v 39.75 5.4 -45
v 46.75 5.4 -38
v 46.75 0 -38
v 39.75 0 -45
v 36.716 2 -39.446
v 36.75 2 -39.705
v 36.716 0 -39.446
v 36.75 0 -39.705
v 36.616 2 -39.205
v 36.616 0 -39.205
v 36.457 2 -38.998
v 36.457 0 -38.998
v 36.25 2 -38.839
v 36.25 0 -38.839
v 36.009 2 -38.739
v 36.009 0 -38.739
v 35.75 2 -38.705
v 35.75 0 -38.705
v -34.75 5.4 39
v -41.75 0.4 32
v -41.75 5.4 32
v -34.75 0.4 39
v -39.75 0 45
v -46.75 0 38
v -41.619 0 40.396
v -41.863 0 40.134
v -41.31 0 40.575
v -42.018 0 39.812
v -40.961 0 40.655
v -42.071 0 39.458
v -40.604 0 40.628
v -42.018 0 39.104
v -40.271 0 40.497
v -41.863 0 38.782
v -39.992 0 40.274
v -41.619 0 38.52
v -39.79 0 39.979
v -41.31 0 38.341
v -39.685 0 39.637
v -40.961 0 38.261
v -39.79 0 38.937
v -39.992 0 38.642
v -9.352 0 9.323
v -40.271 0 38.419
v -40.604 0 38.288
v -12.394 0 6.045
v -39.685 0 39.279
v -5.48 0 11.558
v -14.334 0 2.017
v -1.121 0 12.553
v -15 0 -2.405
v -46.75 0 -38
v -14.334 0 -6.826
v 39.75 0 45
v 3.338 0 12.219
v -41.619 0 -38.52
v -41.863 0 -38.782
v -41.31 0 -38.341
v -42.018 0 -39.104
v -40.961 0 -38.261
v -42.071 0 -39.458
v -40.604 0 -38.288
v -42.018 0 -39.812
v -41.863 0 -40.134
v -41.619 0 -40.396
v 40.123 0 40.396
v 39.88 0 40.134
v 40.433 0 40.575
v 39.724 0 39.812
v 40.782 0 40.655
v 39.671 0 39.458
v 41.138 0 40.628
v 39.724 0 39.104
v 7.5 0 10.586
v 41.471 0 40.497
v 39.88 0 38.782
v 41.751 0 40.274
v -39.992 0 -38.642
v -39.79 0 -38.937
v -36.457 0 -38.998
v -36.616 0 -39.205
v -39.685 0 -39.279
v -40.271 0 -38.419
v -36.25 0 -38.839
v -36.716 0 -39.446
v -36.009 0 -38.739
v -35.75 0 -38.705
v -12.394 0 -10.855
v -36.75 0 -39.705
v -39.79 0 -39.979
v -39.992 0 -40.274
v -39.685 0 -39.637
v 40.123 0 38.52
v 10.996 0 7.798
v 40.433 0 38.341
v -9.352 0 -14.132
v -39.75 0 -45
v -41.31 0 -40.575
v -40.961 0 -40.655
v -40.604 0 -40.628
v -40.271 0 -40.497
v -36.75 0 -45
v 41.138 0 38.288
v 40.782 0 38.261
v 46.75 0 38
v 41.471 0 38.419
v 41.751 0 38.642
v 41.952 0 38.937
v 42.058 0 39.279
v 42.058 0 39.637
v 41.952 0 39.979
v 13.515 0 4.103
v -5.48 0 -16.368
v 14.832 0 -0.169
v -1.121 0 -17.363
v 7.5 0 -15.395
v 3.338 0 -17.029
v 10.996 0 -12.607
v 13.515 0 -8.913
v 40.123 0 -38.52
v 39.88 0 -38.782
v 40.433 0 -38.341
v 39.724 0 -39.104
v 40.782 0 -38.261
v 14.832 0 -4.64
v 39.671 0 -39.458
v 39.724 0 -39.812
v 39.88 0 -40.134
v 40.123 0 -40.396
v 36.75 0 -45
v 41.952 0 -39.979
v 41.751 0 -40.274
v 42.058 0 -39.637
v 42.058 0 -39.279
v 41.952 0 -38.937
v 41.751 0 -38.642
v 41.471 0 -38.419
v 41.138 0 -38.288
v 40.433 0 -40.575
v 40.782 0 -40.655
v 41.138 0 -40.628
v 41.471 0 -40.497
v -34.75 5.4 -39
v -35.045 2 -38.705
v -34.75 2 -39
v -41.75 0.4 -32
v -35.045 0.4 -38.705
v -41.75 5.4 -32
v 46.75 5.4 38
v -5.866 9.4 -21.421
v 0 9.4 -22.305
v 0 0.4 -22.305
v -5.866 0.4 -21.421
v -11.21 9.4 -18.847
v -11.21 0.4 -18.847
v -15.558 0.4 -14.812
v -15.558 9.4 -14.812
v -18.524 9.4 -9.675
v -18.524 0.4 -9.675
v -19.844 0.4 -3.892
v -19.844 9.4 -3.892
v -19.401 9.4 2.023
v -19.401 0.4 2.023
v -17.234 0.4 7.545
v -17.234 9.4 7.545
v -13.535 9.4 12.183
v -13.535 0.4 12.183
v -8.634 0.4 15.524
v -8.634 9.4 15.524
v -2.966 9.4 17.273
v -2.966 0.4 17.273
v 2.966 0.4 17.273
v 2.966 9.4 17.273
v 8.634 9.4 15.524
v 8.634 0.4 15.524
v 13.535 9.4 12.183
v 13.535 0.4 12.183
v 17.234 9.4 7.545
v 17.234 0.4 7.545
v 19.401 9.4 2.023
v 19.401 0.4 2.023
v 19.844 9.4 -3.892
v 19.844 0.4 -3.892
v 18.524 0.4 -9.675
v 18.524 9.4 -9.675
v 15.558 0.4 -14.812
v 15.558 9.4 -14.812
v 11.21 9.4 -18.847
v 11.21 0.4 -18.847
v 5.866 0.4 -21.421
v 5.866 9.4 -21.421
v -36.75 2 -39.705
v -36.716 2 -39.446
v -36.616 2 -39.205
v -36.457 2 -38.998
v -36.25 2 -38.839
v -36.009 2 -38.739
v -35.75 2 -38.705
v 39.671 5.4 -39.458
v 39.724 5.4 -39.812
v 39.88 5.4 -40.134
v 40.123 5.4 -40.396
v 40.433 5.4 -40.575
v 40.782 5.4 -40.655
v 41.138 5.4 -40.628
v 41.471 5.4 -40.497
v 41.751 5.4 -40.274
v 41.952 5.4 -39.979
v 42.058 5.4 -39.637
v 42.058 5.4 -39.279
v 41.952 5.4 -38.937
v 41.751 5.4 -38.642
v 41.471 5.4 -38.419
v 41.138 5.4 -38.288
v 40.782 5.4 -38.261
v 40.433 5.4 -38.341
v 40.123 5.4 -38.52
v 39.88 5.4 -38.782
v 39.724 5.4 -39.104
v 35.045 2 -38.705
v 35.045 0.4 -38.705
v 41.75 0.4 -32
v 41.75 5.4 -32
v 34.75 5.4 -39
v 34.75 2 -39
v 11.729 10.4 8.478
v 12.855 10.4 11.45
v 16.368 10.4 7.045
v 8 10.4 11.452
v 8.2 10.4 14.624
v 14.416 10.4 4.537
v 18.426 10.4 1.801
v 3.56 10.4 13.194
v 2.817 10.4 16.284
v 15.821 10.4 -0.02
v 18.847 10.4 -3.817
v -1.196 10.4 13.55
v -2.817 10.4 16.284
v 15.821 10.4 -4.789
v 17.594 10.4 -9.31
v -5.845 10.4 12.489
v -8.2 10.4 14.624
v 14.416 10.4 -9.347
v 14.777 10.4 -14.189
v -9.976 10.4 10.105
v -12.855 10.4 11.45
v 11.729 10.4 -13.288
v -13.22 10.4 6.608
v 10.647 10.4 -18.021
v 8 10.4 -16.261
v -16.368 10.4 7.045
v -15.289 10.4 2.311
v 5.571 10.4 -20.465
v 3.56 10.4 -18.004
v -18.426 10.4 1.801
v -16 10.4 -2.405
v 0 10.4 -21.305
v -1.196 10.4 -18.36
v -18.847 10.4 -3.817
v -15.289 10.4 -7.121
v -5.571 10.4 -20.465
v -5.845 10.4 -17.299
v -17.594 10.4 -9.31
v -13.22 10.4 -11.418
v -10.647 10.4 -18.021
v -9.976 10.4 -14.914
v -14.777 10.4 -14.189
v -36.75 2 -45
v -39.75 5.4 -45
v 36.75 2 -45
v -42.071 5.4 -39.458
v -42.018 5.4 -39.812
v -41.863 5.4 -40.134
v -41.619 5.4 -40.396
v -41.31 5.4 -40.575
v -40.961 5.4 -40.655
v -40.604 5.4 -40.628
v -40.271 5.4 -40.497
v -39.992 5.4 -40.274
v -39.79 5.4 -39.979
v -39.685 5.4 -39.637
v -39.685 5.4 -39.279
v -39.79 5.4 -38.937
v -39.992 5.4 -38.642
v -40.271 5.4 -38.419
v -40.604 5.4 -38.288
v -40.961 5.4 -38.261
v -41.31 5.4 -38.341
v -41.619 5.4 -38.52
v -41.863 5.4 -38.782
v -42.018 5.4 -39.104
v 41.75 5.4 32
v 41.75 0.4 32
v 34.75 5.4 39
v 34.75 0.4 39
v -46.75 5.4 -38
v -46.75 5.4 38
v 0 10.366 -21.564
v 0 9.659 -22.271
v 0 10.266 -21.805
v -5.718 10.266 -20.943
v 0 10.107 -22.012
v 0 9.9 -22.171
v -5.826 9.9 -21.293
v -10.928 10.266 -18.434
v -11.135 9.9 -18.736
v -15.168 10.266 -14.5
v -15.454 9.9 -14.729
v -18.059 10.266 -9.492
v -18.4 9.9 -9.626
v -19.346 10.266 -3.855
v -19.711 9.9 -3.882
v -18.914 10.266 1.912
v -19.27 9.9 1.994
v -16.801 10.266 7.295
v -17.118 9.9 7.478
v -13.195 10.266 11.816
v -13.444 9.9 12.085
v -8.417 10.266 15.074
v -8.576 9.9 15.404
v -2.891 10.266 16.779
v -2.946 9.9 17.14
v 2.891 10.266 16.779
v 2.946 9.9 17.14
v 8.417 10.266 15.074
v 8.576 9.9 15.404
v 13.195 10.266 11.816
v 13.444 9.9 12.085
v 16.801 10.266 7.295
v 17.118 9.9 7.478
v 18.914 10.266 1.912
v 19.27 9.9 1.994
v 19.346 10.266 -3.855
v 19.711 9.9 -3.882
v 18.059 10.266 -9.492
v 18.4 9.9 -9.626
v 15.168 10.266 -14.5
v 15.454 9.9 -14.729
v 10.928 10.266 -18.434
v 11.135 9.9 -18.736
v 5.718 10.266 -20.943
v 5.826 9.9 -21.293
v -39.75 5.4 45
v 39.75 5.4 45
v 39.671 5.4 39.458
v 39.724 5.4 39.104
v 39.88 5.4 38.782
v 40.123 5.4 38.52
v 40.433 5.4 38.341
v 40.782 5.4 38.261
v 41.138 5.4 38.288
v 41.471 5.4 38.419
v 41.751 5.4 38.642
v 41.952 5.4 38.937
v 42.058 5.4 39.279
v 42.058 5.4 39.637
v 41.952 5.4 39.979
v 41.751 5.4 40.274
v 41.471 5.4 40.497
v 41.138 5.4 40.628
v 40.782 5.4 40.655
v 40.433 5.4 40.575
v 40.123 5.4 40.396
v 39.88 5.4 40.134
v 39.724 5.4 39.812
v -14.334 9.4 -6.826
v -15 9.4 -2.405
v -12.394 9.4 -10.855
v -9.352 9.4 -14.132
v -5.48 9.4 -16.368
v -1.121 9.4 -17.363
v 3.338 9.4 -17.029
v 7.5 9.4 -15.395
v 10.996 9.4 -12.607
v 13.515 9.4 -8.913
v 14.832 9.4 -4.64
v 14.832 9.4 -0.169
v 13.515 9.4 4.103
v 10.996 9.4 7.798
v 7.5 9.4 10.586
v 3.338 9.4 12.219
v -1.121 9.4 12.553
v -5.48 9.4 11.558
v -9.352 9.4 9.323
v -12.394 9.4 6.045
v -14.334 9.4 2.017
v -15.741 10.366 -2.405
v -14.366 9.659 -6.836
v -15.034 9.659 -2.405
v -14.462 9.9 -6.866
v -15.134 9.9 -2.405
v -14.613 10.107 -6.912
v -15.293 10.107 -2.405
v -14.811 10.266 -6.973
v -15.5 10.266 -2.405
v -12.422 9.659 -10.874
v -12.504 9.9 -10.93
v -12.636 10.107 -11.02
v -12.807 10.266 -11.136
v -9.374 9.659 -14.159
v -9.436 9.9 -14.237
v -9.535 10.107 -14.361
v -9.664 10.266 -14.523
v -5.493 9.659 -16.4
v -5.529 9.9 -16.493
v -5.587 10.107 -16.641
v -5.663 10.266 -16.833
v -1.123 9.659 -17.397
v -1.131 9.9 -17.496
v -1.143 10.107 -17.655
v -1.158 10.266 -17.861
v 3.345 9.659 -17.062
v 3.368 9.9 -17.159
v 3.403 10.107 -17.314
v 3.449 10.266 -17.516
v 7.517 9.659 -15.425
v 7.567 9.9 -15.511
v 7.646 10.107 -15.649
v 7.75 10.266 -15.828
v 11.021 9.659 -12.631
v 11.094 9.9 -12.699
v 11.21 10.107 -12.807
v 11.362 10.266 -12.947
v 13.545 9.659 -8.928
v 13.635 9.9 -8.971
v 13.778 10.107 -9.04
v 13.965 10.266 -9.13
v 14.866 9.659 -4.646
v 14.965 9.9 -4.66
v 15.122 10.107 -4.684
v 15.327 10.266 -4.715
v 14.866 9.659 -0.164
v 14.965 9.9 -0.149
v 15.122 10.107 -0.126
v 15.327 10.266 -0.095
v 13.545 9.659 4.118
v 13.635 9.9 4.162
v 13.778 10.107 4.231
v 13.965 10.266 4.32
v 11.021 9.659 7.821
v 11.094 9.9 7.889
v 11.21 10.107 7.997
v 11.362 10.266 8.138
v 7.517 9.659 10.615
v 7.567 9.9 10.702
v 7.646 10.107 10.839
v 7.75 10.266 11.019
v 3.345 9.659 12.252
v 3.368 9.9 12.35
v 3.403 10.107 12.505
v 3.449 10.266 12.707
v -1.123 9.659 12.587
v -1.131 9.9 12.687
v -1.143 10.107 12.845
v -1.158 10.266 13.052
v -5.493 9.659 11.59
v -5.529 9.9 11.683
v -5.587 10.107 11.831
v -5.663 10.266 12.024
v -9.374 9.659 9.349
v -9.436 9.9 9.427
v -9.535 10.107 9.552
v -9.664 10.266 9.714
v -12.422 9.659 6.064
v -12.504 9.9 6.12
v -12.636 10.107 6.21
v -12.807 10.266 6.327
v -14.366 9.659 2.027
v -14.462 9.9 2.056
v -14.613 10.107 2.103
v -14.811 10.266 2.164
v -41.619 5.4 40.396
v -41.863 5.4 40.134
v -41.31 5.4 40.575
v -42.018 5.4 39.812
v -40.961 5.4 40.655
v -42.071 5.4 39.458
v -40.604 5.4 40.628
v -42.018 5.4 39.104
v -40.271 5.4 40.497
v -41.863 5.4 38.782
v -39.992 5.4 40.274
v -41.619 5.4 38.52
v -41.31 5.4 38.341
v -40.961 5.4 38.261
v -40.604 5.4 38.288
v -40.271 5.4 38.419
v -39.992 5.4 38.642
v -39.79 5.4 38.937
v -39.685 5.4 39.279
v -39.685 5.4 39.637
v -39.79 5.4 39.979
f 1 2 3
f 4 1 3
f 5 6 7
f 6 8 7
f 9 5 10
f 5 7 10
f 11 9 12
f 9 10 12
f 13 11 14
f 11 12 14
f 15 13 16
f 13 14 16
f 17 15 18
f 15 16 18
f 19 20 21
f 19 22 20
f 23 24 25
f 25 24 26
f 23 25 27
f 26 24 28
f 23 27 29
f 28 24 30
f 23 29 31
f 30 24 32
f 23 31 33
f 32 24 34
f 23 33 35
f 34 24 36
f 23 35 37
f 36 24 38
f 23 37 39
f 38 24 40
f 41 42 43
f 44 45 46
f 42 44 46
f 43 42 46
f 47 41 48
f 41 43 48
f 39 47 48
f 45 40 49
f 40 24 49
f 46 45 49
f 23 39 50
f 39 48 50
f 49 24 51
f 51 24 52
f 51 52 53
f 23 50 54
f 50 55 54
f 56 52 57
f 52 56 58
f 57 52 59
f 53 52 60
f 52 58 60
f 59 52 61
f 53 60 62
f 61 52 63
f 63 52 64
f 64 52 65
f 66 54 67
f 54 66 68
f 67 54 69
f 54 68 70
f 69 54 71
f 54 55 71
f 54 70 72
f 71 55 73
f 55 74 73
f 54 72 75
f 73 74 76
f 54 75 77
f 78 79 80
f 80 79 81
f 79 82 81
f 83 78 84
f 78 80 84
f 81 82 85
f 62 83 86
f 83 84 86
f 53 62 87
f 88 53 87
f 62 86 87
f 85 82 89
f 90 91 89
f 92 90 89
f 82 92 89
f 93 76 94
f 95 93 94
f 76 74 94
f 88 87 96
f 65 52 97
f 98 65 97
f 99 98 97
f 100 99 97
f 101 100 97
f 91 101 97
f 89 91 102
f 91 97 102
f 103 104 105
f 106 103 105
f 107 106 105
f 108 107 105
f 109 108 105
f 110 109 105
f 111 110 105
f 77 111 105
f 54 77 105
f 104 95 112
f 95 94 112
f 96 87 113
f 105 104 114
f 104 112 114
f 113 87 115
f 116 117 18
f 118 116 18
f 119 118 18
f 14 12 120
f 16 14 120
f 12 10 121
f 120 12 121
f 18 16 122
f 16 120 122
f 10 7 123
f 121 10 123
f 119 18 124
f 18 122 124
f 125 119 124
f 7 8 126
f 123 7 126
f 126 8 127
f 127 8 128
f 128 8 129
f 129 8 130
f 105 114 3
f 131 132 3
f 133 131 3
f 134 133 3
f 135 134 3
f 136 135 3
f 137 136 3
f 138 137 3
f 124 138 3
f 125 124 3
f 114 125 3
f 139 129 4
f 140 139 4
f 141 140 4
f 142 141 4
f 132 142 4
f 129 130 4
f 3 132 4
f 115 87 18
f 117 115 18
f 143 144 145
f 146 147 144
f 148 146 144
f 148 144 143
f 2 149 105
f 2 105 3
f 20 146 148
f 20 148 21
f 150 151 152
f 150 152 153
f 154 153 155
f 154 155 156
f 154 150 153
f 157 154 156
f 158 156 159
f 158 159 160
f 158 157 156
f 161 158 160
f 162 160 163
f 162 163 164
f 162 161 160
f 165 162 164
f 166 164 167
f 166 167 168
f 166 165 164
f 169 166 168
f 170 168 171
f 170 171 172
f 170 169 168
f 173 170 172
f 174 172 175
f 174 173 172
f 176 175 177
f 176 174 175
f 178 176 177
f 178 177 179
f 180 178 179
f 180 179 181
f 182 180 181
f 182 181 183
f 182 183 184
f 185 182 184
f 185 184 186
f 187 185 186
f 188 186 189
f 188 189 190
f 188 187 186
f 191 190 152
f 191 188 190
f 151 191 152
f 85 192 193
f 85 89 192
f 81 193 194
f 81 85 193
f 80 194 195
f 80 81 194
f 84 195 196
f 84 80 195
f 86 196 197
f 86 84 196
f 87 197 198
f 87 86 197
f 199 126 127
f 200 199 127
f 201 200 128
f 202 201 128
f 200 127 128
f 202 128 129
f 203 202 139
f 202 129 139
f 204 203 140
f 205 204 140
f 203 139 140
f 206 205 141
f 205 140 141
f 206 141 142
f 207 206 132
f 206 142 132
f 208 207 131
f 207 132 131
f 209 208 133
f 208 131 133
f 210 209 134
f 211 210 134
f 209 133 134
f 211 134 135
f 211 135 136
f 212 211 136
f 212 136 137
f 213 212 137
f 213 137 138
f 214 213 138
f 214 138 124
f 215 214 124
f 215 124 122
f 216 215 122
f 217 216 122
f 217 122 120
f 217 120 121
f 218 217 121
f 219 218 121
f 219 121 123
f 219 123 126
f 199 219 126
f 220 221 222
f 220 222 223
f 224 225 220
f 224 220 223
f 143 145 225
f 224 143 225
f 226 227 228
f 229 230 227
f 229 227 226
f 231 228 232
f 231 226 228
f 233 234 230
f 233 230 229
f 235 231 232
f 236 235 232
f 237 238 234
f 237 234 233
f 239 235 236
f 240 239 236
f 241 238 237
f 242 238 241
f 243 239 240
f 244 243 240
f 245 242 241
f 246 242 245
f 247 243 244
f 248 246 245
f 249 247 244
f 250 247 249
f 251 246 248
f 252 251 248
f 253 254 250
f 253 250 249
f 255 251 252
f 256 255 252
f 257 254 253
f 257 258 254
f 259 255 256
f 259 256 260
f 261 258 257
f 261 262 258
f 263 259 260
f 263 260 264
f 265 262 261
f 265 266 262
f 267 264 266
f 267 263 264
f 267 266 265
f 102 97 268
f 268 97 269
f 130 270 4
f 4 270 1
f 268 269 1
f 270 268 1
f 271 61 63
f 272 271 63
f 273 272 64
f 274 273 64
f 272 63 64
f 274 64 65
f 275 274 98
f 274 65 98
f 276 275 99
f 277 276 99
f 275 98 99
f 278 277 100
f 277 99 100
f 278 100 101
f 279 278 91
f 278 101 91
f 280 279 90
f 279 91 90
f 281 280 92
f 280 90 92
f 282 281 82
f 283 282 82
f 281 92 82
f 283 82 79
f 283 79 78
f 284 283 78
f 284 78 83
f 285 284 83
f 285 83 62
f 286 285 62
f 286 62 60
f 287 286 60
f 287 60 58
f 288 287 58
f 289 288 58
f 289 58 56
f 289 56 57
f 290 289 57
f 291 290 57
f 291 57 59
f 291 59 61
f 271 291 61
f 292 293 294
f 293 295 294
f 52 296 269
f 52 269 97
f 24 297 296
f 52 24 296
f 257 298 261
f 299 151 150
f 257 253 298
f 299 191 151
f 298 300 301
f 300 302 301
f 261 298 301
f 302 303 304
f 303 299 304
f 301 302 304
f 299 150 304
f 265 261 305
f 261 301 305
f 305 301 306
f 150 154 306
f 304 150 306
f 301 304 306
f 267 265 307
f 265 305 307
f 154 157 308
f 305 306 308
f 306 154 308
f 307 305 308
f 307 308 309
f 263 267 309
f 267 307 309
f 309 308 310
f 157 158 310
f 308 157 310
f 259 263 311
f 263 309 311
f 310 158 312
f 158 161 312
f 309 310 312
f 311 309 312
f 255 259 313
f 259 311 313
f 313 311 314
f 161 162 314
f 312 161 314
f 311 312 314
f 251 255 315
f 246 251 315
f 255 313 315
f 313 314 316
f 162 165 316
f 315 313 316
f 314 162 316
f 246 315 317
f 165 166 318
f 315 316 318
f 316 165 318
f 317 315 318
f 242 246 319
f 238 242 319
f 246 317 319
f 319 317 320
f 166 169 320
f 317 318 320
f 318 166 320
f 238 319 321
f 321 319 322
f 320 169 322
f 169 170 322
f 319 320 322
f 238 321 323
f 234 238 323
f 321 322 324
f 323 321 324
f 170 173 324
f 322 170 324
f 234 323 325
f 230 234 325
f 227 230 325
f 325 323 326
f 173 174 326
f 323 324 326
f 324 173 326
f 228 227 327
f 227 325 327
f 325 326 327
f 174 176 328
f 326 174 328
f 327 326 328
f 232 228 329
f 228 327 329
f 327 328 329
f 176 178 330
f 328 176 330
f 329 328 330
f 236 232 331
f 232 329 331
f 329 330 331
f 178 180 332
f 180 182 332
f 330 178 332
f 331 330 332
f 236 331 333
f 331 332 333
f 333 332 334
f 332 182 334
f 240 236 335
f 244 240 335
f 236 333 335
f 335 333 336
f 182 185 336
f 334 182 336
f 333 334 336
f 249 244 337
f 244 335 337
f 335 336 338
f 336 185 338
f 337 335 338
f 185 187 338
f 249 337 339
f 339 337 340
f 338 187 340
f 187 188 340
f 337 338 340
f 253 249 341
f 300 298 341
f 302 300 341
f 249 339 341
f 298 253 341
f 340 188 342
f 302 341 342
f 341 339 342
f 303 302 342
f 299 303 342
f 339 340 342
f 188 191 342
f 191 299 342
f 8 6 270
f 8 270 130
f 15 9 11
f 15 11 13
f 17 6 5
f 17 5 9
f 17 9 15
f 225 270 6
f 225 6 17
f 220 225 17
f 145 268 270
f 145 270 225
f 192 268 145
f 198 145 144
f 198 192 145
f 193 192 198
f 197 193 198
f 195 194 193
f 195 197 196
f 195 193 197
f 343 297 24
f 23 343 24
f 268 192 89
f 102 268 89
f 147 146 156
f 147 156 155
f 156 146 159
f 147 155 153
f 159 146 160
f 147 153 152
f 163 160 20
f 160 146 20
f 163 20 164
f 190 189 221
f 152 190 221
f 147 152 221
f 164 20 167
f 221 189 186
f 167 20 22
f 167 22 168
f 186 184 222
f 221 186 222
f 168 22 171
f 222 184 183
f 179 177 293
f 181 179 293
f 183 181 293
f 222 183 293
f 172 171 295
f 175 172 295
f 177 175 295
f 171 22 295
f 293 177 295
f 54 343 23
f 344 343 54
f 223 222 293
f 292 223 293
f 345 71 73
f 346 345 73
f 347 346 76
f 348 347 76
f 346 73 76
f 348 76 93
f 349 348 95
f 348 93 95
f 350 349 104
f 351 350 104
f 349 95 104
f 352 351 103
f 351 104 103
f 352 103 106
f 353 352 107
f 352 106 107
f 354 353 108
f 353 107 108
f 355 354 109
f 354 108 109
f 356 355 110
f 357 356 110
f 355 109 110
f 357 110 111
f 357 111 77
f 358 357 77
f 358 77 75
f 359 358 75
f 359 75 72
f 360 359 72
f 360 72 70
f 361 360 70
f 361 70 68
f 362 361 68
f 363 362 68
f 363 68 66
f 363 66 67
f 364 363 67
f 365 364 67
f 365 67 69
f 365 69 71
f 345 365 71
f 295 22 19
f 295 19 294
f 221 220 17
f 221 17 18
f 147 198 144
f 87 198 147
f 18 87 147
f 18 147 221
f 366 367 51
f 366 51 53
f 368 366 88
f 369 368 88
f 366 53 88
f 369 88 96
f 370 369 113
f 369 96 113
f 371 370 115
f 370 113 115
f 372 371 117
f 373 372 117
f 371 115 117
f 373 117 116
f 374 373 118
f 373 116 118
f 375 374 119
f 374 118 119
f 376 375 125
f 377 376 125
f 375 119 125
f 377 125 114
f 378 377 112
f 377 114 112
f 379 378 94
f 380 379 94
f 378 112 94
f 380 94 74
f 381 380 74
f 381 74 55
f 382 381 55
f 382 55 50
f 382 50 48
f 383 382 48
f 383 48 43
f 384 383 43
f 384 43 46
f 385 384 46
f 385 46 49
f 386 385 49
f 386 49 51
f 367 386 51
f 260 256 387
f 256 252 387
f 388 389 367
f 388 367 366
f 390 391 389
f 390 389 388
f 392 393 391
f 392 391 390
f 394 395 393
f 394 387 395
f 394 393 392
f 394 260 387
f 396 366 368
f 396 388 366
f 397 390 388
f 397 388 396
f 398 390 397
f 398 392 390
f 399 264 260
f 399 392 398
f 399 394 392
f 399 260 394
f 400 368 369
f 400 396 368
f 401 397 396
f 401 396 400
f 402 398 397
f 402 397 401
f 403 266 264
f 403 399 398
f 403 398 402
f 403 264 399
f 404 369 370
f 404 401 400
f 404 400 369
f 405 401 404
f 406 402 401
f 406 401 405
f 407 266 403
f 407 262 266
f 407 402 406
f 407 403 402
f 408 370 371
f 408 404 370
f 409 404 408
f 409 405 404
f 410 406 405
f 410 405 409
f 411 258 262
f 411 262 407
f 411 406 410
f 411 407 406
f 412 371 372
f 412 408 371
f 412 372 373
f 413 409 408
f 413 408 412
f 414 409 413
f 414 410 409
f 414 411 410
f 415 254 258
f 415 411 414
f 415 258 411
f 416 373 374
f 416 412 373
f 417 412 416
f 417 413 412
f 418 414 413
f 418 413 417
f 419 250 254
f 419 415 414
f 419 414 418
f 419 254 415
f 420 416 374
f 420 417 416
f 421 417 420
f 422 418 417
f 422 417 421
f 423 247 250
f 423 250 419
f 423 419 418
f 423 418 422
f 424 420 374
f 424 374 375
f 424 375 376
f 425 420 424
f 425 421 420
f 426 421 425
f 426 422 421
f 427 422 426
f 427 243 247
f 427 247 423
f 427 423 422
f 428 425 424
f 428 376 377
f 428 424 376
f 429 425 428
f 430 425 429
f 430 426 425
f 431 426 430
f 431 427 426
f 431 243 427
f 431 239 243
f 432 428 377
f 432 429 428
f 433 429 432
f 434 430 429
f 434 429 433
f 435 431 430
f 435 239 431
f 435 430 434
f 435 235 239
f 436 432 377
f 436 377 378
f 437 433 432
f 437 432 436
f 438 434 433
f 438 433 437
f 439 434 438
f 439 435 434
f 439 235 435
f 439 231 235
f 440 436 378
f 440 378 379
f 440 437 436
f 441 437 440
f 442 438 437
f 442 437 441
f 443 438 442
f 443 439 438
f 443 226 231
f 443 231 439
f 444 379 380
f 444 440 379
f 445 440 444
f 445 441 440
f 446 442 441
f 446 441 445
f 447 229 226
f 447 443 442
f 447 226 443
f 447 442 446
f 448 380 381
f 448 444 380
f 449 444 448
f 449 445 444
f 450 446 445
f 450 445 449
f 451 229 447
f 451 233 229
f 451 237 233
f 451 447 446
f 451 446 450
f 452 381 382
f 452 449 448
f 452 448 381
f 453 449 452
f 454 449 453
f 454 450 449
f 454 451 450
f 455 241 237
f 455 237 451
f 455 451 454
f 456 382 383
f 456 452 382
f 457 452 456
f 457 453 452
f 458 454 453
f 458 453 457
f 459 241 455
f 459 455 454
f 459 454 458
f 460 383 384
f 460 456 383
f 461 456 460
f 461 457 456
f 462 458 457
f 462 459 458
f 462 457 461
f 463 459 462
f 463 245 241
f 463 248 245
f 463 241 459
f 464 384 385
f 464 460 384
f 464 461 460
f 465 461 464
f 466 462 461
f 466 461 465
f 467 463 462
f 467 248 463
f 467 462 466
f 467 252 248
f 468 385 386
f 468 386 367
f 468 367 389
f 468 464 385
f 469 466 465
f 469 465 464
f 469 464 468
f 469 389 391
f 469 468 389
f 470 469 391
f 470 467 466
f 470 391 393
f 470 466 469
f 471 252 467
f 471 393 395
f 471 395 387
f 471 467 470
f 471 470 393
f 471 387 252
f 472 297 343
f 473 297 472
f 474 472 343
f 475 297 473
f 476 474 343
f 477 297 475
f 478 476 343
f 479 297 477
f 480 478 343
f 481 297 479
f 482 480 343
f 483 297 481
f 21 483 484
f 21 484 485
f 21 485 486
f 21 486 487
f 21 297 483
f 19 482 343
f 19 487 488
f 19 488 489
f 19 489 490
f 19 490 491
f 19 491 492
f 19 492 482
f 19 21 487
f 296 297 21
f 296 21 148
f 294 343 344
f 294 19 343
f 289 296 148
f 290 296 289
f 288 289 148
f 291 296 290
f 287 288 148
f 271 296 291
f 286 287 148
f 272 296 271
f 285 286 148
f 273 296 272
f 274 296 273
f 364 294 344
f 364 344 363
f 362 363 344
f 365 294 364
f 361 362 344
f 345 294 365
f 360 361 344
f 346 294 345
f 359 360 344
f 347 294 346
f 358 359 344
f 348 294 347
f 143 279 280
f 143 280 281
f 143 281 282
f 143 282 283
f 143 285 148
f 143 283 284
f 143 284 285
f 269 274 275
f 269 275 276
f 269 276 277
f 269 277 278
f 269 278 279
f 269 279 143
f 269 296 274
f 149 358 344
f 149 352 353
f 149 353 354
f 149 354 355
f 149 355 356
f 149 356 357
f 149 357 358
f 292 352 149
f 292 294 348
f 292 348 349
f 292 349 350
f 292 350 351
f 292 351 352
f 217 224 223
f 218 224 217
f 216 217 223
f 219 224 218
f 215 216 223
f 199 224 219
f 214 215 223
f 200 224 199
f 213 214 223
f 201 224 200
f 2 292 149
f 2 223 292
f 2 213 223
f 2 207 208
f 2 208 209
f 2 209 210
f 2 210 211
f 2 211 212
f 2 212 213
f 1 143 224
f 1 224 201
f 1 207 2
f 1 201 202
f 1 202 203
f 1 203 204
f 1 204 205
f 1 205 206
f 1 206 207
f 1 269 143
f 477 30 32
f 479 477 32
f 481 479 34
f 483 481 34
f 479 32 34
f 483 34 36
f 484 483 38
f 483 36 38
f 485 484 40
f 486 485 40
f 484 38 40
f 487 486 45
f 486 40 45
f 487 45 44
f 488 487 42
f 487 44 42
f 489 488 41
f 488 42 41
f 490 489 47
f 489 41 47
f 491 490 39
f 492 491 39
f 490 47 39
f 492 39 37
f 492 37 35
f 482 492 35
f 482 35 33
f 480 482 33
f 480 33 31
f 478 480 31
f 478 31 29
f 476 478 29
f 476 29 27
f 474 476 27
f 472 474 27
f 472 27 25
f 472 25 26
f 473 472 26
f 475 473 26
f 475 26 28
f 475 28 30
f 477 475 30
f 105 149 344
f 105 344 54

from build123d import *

# Parameters (mm, degrees)
SKETCH1_W             = 93.5
SKETCH1_H             = 90
BOSS_EXTRUDE1_DEPTH   = 5.4
CUT_EXTRUDE1_REACH    = 66.978
SKETCH2_W             = 83.5
SKETCH2_H             = 78
CHAMFER1_SIZE         = 7
CHAMFER2_SIZE         = 7
CHAMFER3_SIZE         = 7
CHAMFER4_SIZE         = 7
CHAMFER5_SIZE         = 7
CHAMFER6_SIZE         = 7
CHAMFER7_SIZE         = 7
CHAMFER8_SIZE         = 7
CUT_EXTRUDE2_REACH    = 67.081
SKETCH4_W             = 2
SKETCH4_H             = 6.295211976
CUT_EXTRUDE3_DEPTH    = 73.5
SKETCH5_R             = 19.9
BOSS_EXTRUDE2_DEPTH   = 10
F_2_CLEARANCE_HOLE1_D = 2.4
F_2_CLEARANCE_HOLE2_D = 2.4
F_2_CLEARANCE_HOLE3_D = 2.4
F_2_CLEARANCE_HOLE4_D = 2.4
HOLE1_D               = 30
FILLET1_R             = 1
FILLET2_R             = 1


with BuildPart() as part:
    # Sketch1 → Boss-Extrude1 (new body)
    with BuildSketch(Plane(origin=(0, 5.4, 0), x_dir=(1, 0, 0), z_dir=(0, 1, 0))):
        Rectangle(SKETCH1_W, SKETCH1_H)
    extrude(amount=-BOSS_EXTRUDE1_DEPTH)

    # Sketch2 → Cut-Extrude1 (cut, up to next)
    with BuildSketch(Plane.XZ.offset(-2), mode=Mode.PRIVATE) as cut_extrude1_sk1:
        Rectangle(SKETCH2_W, SKETCH2_H)
    cut_extrude1_tool1 = extrude(cut_extrude1_sk1.sketch, amount=-CUT_EXTRUDE1_REACH, mode=Mode.PRIVATE) & part.part
    add(cut_extrude1_tool1.solids().sort_by_distance((0, 2, 0))[0], mode=Mode.SUBTRACT)

    # Chamfer1
    chamfer1_edges = [part.edges().sort_by_distance(p)[0] for p in [
        (41.75, 3.7, -39),
    ]]
    chamfer(chamfer1_edges, length=CHAMFER1_SIZE)

    # Chamfer2
    chamfer2_edges = [part.edges().sort_by_distance(p)[0] for p in [
        (41.75, 3.7, 39),
    ]]
    chamfer(chamfer2_edges, length=CHAMFER2_SIZE)

    # Chamfer3
    chamfer3_edges = [part.edges().sort_by_distance(p)[0] for p in [
        (46.75, 2.7, 45),
    ]]
    chamfer(chamfer3_edges, length=CHAMFER3_SIZE)

    # Chamfer4
    chamfer4_edges = [part.edges().sort_by_distance(p)[0] for p in [
        (46.75, 2.7, -45),
    ]]
    chamfer(chamfer4_edges, length=CHAMFER4_SIZE)

    # Chamfer5
    chamfer5_edges = [part.edges().sort_by_distance(p)[0] for p in [
        (-46.75, 2.7, -45),
    ]]
    chamfer(chamfer5_edges, length=CHAMFER5_SIZE)

    # Chamfer6
    chamfer6_edges = [part.edges().sort_by_distance(p)[0] for p in [
        (-41.75, 3.7, -39),
    ]]
    chamfer(chamfer6_edges, length=CHAMFER6_SIZE)

    # Chamfer7
    chamfer7_edges = [part.edges().sort_by_distance(p)[0] for p in [
        (-46.75, 2.7, 45),
    ]]
    chamfer(chamfer7_edges, length=CHAMFER7_SIZE)

    # Chamfer8
    chamfer8_edges = [part.edges().sort_by_distance(p)[0] for p in [
        (-41.75, 3.7, 39),
    ]]
    chamfer(chamfer8_edges, length=CHAMFER8_SIZE)

    # Sketch3 → Cut-Extrude2 (cut, up to next)
    with BuildSketch(Plane.XZ.offset(-0.4), mode=Mode.PRIVATE) as cut_extrude2_sk1:
        Polygon((-41.75, -32), (-35.045211976, -38.704788024), (35.045211976, -38.704788024), (41.75, -32), (41.75, 32), (34.75, 39), (-34.75, 39), (-41.75, 32), align=None)
    cut_extrude2_tool1 = extrude(cut_extrude2_sk1.sketch, amount=-CUT_EXTRUDE2_REACH, mode=Mode.PRIVATE) & part.part
    add(cut_extrude2_tool1.solids().sort_by_distance((0, 0.4, 0.125192))[0], mode=Mode.SUBTRACT)

    # Sketch4 → Cut-Extrude3 (cut)
    with BuildSketch(Plane(origin=(-36.75, 0, 0), x_dir=(0, -1, 0), z_dir=(-1, 0, 0))):
        with Locations((-1, -41.852394012)):
            Rectangle(SKETCH4_W, SKETCH4_H)
    extrude(amount=-CUT_EXTRUDE3_DEPTH, mode=Mode.SUBTRACT)

    # Sketch5 → Boss-Extrude2 (add)
    with BuildSketch(Plane(origin=(0, 10.4, 0), x_dir=(1, 0, 0), z_dir=(0, 1, 0))):
        with Locations(Location((0, 2.404788024, 0), (0, 0, 90))):
            Circle(SKETCH5_R)
    extrude(amount=-BOSS_EXTRUDE2_DEPTH)

    # #2 Clearance Hole1 (through all)
    with Locations(Plane(origin=(0, 5.4, 0), x_dir=(1, 0, 0), z_dir=(0, 1, 0))):
        with Locations((40.871180413, -39.457859948)):
            Hole(F_2_CLEARANCE_HOLE1_D / 2)

    # #2 Clearance Hole2 (through all)
    with Locations(Plane(origin=(0, 5.4, 0), x_dir=(1, 0, 0), z_dir=(0, 1, 0))):
        with Locations((40.871180413, 39.457859948)):
            Hole(F_2_CLEARANCE_HOLE2_D / 2)

    # #2 Clearance Hole3 (through all)
    with Locations(Plane(origin=(0, 5.4, 0), x_dir=(1, 0, 0), z_dir=(0, 1, 0))):
        with Locations((-40.871180413, 39.457859948)):
            Hole(F_2_CLEARANCE_HOLE3_D / 2)

    # #2 Clearance Hole4 (through all)
    with Locations(Plane(origin=(0, 5.4, 0), x_dir=(1, 0, 0), z_dir=(0, 1, 0))):
        with Locations((-40.871180413, -39.457859948)):
            Hole(F_2_CLEARANCE_HOLE4_D / 2)

    # Hole1 (through all)
    with Locations(Plane(origin=(0, 10.4, 0), x_dir=(1, 0, 0), z_dir=(0, 1, 0))):
        with Locations((0, 2.404788024)):
            Hole(HOLE1_D / 2)

    # Fillet1
    fillet1_edges = [part.edges().sort_by_distance(p)[0] for p in [
        (36.75, 1, -38.704788024),
        (-36.75, 1, -38.704788024),
    ]]
    fillet(fillet1_edges, radius=FILLET1_R)

    # Fillet2
    fillet2_edges = [part.edges().sort_by_distance(p)[0] for p in [
        (0, 10.4, 17.495211976),
        (15, 10.4, -2.404788024),
    ]]
    fillet(fillet2_edges, radius=FILLET2_R)


solid = part.part
